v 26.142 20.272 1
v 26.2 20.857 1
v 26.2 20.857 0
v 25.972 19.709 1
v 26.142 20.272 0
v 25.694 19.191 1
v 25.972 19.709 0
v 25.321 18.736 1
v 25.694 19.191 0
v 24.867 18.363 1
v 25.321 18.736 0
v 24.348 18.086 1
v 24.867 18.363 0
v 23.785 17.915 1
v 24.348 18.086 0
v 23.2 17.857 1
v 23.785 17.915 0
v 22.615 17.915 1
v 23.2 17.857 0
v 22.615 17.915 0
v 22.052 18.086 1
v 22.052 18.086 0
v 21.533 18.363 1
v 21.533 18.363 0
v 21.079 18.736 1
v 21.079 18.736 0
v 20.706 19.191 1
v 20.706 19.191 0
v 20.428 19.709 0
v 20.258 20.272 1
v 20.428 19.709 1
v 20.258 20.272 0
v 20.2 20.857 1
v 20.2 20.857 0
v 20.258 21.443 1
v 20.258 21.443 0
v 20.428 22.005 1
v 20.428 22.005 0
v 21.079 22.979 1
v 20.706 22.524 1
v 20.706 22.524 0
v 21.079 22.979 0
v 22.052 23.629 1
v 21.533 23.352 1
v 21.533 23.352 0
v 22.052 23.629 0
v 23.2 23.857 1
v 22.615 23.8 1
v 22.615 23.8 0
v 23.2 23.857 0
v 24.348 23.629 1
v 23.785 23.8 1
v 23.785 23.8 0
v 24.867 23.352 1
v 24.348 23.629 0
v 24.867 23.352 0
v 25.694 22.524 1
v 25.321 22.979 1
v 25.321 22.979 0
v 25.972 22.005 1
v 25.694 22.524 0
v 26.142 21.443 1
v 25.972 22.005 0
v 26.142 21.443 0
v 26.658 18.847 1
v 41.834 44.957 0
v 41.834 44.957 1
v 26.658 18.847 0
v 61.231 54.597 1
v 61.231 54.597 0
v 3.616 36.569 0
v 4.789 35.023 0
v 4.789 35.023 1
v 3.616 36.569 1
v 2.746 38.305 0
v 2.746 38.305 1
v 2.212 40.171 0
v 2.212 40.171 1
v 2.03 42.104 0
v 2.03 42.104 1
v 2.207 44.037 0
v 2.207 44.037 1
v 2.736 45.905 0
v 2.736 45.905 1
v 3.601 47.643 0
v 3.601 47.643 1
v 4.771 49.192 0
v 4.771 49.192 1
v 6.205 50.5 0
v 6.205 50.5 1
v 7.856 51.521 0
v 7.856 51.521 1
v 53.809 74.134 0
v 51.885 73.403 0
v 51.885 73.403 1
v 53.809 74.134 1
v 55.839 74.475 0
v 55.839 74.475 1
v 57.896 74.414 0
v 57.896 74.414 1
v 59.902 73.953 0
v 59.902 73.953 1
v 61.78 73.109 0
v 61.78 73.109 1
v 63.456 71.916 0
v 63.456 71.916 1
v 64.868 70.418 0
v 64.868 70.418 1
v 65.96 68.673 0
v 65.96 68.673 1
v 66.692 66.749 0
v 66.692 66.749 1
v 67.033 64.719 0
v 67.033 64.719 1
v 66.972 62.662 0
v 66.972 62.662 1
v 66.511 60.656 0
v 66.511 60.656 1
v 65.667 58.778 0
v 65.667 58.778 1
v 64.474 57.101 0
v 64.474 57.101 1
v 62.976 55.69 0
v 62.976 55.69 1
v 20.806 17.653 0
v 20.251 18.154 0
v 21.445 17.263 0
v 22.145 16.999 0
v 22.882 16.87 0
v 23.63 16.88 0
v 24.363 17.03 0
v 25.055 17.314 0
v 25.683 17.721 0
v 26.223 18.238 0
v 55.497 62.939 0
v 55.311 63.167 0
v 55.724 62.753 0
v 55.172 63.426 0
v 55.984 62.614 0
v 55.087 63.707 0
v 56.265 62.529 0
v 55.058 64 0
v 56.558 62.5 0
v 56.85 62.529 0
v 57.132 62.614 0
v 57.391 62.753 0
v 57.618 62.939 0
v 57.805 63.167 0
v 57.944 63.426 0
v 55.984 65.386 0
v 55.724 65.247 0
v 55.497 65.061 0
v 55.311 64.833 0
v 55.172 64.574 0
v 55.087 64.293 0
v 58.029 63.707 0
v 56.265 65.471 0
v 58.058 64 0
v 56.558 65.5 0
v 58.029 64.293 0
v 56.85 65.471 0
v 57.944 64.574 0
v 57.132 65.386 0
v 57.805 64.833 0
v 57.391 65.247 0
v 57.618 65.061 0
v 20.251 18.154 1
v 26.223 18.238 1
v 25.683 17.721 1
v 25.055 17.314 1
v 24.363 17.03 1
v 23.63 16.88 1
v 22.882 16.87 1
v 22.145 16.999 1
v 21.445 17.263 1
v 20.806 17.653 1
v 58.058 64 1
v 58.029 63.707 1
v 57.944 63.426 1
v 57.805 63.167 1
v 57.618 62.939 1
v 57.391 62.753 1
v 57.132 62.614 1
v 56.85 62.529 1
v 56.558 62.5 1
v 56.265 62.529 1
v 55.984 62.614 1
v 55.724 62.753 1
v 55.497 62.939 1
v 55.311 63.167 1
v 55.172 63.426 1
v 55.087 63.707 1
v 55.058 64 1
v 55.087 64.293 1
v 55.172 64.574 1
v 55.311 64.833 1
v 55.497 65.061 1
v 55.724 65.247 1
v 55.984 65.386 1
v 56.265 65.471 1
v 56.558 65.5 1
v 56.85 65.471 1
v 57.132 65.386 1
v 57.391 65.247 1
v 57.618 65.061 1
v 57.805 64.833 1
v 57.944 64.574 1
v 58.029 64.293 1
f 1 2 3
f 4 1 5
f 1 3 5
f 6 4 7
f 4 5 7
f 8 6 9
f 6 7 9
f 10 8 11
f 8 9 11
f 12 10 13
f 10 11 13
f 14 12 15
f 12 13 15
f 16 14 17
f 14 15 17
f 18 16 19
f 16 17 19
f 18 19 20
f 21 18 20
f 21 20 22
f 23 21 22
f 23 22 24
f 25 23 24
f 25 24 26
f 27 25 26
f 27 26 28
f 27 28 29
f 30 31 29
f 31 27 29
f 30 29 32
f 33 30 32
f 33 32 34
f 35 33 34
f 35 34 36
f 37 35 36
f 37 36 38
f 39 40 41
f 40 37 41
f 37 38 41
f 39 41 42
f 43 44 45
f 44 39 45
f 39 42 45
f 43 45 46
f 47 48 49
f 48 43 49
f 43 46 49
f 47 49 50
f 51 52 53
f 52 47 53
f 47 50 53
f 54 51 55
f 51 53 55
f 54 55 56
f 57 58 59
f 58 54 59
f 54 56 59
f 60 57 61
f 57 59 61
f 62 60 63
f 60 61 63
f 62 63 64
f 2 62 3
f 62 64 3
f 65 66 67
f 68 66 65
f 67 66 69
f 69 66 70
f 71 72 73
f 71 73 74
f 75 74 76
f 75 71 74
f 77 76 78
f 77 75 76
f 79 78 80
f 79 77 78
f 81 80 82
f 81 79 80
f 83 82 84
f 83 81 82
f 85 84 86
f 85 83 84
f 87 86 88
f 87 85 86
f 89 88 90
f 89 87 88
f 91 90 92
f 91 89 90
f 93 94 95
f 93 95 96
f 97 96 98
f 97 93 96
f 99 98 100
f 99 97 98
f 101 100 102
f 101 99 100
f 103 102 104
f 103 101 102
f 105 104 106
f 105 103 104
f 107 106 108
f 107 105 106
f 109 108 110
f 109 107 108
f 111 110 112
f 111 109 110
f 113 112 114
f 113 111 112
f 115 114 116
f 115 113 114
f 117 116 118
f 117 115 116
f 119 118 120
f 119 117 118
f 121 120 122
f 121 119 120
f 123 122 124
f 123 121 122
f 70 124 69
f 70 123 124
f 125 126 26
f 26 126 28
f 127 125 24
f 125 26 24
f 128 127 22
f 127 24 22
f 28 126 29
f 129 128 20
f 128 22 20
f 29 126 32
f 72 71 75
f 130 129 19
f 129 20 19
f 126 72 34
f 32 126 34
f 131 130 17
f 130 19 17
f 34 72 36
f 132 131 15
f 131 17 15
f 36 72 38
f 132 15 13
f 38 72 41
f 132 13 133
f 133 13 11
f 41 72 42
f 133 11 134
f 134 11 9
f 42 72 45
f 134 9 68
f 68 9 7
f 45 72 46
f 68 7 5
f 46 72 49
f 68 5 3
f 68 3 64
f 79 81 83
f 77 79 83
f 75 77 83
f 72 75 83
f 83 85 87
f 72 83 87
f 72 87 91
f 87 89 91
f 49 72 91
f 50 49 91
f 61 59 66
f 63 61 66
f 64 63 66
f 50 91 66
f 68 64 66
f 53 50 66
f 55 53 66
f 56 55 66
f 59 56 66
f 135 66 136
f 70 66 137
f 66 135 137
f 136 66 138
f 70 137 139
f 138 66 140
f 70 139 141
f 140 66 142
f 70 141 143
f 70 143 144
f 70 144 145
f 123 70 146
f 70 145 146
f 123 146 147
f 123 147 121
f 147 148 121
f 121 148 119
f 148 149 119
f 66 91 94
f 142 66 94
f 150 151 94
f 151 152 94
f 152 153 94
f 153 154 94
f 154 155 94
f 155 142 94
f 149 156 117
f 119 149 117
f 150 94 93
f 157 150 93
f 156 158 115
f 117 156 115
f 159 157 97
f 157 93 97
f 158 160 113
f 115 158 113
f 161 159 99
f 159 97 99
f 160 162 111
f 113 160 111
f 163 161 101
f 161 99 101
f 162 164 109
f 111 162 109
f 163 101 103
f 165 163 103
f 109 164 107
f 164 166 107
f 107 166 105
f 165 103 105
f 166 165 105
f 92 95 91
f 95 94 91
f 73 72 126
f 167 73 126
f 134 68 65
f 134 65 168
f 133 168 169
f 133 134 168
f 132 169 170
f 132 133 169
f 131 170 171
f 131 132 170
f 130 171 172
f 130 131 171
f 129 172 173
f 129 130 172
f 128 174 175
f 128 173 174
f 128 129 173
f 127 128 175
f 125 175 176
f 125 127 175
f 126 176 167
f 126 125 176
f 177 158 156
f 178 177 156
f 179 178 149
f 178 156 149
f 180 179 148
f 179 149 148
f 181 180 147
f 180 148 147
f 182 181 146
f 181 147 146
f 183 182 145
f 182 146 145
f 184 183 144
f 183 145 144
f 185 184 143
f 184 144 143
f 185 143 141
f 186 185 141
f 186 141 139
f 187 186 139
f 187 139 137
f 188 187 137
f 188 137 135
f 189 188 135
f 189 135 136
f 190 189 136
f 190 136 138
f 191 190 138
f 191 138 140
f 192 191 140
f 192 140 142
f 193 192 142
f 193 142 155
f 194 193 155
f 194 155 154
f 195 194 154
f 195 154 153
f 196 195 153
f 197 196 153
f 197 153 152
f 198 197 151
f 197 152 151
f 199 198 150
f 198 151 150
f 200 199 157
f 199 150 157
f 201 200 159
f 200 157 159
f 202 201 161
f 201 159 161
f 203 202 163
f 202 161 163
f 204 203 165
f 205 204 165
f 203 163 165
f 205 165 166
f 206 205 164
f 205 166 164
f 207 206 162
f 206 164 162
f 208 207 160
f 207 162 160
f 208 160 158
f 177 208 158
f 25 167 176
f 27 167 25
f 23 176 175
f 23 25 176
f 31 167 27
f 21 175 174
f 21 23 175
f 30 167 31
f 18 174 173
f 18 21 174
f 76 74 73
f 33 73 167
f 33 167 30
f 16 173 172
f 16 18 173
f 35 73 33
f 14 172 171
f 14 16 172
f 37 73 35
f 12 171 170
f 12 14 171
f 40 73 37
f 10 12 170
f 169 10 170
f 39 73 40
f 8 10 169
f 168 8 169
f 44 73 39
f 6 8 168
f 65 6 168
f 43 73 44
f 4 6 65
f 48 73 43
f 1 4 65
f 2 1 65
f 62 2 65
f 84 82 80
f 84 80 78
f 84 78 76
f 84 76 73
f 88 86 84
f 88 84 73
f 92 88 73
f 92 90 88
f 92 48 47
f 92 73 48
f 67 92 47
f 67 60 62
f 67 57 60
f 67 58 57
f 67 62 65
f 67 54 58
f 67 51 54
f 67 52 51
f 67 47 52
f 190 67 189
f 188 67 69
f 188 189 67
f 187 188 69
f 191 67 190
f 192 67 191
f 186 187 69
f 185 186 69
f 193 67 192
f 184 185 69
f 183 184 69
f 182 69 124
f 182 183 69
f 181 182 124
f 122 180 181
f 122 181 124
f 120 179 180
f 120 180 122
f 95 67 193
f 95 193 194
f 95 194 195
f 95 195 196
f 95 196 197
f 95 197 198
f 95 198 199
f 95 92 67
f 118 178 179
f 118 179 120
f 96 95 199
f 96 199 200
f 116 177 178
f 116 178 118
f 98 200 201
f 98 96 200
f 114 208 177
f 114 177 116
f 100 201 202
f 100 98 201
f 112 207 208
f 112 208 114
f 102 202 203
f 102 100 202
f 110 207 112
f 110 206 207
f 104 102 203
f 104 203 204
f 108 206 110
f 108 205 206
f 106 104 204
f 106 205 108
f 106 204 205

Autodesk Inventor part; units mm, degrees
ref_plane "YZ Plane" through (0, 0, 0) normal (1, 0, 0) x (0, 1, 0)
ref_plane "XZ Plane" through (0, 0, 0) normal (0, 1, 0) x (-1, 0, 0)
ref_plane "XY Plane" through (0, 0, 0) normal (0, 0, 1) x (1, 0, 0)
sketch "スケッチ1" plane through (0, 0, 0) normal (0, 0, 1) x (1, 0, 0)
  circle A0 centre (23.2, 20.8573) radius 3
  circle A1 centre (56.5578, 64) radius 1.5
  line L0 (23.2, 20.8573) -> (56.5578, 64)
  line L1 (23.2, 20.8573) -> (56.5578, 64) construction
  circle A2 centre (56.5578, 64) radius 1.5
  line L2 (23.2, 20.8573) -> (12.5297, 42.1181)
  line L3 (12.5297, 42.1181) -> (56.5578, 64) construction
  line L4 (17.2029, 32.7153) -> (61.231, 54.5973)
  line L5 (51.8846, 73.4027) -> (7.8565, 51.5208)
  arc A3 (7.8565, 51.5208) -> (17.2029, 32.7153) centre (12.5297, 42.1181) ccw
  arc A4 (61.231, 54.5973) -> (51.8846, 73.4027) centre (56.5578, 64) ccw
  circle A5 centre (23.2, 20.8573) radius 4
  line L6 (4.7893, 35.0232) -> (20.2513, 18.1545)
  line L7 (41.8337, 44.9568) -> (26.6583, 18.8472)
  point P0 (0, 0)
  point P1 (0, 0)
  point P2 (39.8789, 42.4286)
  point P3 (34.5437, 53.059)
  point P4 (26.2844, 23.4042)
  point P5 (20.1698, 18.2461)
  point P6 (25.5392, 22.7356)
  point P7 (21.8543, 23.5385)
  point P8 (21.4058, 24.4323)
  point P9 (25.6467, 24.0217)
  point P10 (25.035, 23.2306)
  dimension "d6" = 3
  dimension "d7" = 21
  dimension "d8" = 8
extrude "押し出し1" add sketch "スケッチ1" along normal blind 1 contours A0 L0 A5 L2 | A0 L2 A5 L0 | A5 L2 L4 L0 | L0 L7 A5 | A5 L6 A3 L4 L2 | L4 A3 L5 A4
properties part number "ダンパーガード" material "ポリカーボネート、クリア"
